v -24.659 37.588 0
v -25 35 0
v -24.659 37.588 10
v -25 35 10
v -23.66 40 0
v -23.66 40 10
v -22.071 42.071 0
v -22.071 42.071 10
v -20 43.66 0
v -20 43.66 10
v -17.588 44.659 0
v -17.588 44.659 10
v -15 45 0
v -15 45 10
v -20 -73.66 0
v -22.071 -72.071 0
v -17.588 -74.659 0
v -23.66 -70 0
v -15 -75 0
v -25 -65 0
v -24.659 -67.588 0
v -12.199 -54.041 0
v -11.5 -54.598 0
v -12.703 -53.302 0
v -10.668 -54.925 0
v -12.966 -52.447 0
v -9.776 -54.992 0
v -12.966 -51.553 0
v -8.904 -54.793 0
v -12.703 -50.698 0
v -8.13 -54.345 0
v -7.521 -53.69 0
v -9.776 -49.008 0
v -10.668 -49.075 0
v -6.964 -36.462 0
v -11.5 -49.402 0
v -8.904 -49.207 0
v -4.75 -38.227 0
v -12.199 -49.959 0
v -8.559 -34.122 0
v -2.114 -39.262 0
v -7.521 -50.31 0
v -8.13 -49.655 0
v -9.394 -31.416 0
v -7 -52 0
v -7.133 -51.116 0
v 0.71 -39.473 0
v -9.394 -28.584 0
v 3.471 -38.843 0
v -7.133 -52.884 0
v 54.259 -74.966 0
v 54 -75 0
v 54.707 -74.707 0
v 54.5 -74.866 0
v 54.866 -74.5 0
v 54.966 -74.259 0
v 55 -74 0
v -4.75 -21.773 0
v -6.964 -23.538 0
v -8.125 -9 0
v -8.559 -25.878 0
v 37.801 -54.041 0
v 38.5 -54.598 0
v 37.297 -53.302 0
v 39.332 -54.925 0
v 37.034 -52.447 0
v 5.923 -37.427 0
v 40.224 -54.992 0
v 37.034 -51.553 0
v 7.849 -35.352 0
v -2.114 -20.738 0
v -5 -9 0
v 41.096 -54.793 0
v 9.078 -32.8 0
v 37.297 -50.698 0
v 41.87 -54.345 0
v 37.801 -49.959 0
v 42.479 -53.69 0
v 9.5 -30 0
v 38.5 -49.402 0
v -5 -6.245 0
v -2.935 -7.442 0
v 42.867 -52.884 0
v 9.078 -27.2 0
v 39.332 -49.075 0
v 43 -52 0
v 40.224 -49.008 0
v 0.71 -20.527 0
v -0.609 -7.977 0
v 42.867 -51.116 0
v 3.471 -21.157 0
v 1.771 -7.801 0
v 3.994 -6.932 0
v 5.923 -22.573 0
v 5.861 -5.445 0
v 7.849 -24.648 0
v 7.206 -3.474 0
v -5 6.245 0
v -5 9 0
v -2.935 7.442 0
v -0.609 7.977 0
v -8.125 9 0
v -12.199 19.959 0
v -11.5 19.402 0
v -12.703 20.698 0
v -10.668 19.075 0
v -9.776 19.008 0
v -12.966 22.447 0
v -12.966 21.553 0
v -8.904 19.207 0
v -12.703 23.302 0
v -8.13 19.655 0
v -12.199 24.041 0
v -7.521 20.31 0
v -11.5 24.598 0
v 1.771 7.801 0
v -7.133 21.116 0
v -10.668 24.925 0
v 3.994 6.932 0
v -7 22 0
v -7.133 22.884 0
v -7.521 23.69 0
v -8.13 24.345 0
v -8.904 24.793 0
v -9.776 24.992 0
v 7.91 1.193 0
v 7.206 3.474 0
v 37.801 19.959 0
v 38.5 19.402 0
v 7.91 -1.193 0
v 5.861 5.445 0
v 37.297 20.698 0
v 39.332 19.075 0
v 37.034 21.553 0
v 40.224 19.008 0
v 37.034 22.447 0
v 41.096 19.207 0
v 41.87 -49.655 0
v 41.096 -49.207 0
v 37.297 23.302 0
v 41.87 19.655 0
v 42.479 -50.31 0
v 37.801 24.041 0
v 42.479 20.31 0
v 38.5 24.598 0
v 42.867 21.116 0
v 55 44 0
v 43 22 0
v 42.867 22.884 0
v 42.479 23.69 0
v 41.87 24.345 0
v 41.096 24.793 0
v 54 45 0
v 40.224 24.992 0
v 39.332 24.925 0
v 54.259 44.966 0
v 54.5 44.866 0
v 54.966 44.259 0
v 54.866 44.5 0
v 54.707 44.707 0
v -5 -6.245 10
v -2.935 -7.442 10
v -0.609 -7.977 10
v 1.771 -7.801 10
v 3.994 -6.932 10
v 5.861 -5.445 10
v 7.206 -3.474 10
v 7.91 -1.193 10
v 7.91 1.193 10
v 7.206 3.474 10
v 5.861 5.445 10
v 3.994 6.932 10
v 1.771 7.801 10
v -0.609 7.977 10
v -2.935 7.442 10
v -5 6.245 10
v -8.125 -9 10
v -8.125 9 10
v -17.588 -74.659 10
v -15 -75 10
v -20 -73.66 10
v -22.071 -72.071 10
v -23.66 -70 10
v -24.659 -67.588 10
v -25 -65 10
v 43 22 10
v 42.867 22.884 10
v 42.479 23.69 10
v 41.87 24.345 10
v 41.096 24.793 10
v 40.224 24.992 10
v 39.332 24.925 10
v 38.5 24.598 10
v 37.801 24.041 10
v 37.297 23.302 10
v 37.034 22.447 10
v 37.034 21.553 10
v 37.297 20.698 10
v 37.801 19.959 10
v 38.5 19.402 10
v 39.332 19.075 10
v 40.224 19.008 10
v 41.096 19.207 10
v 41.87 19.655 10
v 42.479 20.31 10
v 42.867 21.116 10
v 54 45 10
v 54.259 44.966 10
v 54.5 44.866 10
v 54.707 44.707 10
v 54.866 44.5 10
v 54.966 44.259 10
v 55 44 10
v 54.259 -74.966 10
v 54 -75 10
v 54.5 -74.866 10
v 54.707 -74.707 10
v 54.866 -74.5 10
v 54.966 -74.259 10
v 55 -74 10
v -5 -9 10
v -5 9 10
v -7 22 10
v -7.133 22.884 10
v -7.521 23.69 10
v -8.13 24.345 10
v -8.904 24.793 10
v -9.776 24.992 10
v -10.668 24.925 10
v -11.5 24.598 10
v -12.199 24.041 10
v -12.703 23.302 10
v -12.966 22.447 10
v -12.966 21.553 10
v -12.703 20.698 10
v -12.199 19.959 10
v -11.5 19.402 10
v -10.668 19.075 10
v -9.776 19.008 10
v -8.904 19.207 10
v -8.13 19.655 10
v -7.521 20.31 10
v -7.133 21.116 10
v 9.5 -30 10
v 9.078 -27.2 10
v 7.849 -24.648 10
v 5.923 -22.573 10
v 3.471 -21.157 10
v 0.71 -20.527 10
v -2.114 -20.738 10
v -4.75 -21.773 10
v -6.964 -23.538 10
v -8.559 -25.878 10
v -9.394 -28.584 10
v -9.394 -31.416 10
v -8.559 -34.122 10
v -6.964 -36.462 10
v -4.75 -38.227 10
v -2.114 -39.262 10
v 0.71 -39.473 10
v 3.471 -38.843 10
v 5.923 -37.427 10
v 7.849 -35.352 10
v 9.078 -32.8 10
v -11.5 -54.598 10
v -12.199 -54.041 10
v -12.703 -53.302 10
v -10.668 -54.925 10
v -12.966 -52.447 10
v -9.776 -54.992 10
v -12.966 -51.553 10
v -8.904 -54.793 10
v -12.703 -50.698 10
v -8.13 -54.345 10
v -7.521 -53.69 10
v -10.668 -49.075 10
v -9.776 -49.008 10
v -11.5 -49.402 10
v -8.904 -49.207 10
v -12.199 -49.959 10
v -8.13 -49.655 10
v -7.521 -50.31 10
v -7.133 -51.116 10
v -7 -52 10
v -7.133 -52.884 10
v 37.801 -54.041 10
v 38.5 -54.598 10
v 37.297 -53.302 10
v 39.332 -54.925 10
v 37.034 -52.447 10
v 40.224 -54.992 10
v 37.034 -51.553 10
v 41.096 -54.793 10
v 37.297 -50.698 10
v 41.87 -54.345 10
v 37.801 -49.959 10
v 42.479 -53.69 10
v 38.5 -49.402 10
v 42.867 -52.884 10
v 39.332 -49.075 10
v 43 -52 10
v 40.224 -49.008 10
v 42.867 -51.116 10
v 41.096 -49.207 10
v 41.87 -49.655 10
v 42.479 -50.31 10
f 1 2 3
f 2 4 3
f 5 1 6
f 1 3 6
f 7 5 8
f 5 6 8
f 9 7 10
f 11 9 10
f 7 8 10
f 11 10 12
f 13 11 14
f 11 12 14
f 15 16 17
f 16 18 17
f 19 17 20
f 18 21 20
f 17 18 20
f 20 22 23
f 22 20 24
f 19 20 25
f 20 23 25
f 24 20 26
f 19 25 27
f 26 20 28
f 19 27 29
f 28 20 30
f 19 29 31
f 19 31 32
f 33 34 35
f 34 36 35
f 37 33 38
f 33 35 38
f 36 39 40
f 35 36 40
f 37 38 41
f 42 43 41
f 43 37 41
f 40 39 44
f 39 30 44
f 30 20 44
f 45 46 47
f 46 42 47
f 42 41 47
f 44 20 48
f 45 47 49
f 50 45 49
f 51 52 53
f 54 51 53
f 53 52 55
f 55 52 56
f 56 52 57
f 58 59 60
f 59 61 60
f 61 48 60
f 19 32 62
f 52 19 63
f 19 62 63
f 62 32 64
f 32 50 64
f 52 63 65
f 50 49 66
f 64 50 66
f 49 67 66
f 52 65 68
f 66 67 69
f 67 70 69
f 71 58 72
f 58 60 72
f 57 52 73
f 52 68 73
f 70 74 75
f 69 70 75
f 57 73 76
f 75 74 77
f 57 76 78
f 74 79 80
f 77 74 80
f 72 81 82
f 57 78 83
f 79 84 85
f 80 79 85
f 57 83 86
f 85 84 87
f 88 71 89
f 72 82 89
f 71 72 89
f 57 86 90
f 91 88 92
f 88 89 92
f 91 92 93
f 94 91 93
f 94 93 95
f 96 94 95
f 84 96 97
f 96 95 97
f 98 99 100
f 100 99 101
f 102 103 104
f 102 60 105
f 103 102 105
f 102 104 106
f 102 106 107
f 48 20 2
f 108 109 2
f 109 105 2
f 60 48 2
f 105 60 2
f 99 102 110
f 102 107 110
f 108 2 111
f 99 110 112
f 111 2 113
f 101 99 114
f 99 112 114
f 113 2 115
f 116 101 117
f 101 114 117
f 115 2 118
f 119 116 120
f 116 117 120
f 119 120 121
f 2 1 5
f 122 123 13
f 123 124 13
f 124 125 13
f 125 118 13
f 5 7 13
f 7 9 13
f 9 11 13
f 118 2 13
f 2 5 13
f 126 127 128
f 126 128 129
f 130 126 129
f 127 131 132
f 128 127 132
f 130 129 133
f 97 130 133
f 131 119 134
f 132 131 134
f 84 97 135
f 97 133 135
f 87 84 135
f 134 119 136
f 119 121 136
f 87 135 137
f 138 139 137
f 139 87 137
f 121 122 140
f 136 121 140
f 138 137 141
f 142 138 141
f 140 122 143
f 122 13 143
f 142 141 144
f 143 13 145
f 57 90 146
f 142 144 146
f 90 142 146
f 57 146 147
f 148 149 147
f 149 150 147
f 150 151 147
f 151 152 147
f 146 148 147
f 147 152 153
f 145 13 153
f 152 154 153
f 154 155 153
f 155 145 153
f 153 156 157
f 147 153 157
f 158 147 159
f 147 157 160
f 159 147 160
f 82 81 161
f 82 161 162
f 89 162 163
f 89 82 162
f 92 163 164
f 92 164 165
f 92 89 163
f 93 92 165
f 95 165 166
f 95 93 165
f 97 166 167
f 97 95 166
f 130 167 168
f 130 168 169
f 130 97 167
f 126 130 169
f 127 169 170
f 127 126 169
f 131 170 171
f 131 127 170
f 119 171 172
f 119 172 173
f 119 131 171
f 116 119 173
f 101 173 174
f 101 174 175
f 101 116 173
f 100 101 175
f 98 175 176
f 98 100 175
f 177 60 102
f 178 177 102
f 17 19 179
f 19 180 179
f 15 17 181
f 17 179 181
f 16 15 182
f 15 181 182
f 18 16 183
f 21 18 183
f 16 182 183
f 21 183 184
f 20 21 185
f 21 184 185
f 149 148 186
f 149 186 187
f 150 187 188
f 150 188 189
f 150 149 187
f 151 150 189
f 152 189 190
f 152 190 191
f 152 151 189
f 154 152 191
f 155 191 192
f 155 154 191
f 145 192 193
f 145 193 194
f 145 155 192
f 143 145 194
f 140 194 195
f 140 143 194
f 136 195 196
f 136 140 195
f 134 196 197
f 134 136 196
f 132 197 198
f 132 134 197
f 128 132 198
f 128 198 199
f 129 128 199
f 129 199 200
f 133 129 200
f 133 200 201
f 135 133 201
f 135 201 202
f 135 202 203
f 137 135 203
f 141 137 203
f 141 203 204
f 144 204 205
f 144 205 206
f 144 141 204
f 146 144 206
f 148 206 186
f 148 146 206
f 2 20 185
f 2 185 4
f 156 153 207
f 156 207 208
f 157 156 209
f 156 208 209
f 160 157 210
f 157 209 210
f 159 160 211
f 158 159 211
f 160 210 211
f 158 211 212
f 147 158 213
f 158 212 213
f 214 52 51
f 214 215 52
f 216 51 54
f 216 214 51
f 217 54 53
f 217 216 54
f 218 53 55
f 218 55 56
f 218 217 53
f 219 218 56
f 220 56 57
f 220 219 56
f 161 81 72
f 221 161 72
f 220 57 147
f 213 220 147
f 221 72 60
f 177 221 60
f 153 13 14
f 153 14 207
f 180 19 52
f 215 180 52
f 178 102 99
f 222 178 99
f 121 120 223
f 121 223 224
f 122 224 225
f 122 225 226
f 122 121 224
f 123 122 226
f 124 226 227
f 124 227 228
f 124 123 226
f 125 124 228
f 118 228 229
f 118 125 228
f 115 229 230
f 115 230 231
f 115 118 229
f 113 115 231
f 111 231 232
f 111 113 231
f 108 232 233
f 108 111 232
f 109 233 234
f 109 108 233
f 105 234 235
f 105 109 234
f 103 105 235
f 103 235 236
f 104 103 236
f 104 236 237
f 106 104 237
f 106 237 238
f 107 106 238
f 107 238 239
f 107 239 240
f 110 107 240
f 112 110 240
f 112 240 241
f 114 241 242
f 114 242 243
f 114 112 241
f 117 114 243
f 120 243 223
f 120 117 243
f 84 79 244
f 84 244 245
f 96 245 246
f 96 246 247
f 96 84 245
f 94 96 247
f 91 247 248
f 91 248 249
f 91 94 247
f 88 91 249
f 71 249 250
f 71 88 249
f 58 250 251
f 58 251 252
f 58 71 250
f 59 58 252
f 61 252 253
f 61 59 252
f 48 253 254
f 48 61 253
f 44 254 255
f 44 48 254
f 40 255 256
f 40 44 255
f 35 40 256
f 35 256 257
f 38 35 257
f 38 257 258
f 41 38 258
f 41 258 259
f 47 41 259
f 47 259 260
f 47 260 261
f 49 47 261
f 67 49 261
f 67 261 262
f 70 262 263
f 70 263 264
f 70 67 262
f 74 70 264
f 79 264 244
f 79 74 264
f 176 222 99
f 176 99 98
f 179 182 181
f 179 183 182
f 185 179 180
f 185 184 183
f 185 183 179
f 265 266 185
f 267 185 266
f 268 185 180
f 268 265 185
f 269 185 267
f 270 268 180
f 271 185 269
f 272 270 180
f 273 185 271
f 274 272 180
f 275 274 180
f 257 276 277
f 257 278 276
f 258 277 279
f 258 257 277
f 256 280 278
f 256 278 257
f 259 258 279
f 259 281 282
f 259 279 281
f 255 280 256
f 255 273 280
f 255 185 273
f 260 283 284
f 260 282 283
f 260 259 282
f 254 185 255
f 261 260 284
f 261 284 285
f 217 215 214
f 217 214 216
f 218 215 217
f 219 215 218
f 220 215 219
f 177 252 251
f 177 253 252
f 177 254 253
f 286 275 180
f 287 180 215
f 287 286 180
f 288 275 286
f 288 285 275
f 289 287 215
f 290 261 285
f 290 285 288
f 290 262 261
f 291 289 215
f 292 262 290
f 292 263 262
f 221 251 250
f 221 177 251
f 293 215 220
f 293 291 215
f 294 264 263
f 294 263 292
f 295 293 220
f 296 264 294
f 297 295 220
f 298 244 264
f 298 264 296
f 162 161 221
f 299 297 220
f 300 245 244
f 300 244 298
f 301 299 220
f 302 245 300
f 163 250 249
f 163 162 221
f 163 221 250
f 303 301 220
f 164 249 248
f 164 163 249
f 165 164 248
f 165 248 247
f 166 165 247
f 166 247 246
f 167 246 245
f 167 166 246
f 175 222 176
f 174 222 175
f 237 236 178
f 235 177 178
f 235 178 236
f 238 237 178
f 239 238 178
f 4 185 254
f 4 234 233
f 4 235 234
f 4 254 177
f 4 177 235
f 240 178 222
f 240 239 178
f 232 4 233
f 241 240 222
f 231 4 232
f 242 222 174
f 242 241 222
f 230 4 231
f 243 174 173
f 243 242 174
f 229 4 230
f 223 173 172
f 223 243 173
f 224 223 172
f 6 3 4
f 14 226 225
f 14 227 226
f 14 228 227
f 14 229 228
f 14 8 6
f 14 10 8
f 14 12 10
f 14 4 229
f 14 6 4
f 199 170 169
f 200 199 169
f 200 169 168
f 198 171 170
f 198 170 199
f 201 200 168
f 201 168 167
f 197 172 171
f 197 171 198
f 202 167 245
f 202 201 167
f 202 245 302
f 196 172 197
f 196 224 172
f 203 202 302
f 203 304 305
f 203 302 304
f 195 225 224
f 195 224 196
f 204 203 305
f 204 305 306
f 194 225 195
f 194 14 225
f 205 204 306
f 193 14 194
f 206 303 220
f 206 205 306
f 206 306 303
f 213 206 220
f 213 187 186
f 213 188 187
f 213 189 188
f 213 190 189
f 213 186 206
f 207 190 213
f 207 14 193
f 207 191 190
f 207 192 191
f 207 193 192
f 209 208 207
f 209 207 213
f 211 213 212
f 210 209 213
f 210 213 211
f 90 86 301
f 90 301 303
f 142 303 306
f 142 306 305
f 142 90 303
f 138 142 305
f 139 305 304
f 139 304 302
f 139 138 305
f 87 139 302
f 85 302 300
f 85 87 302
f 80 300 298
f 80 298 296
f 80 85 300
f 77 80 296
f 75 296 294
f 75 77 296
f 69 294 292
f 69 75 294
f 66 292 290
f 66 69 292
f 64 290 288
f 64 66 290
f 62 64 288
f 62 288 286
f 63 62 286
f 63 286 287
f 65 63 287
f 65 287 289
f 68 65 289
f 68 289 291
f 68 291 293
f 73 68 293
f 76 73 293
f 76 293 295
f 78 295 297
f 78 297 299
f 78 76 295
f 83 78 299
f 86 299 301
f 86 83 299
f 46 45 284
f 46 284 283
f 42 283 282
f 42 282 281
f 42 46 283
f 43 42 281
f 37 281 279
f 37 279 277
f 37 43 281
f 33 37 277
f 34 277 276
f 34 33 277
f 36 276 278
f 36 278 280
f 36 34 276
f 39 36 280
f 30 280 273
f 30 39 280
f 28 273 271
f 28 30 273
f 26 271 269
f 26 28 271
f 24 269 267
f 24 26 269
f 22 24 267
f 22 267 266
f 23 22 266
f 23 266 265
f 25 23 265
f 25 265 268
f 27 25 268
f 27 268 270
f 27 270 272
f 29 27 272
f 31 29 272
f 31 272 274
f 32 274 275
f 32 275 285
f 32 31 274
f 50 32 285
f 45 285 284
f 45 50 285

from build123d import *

# Parameters (mm, degrees)
SKETCH_W    = 80
SKETCH_H    = 120
SKETCH_R    = 9.5
SKETCH_R_2  = 3
PAD_DEPTH   = 10
FILLET_R    = 1
FILLET001_R = 10


with BuildPart() as part:
    # Sketch → Pad (new body)
    with BuildSketch(Plane.XY):
        with Locations((15, -15)):
            Rectangle(SKETCH_W, SKETCH_H)
        with Locations((0, -30)):
            Circle(SKETCH_R, mode=Mode.SUBTRACT)
        with Locations((-10, -52)):
            Circle(SKETCH_R_2, mode=Mode.SUBTRACT)
        with Locations((40, -52)):
            Circle(SKETCH_R_2, mode=Mode.SUBTRACT)
        with Locations((40, 22)):
            Circle(SKETCH_R_2, mode=Mode.SUBTRACT)
        with Locations((-10, 22)):
            Circle(SKETCH_R_2, mode=Mode.SUBTRACT)
        with BuildLine():
            ThreePointArc((-5, -6.244998), (8, 0), (-5, 6.244998))
            Line((-5, 9), (-5, 6.244998))
            Line((-8.125, 9), (-5, 9))
            Line((-8.125, -9), (-8.125, 9))
            Line((-5, -9), (-8.125, -9))
            Line((-5, -6.244998), (-5, -9))
        make_face(mode=Mode.SUBTRACT)
    extrude(amount=PAD_DEPTH)

    # Fillet
    fillet_edges = [part.edges().sort_by_distance(p)[0] for p in [
        (55, -75, 5),
        (55, 45, 5),
    ]]
    fillet(fillet_edges, radius=FILLET_R)

    # Fillet001
    fillet001_edges = [part.edges().sort_by_distance(p)[0] for p in [
        (-25, -75, 5),
        (-25, 45, 5),
    ]]
    fillet(fillet001_edges, radius=FILLET001_R)


solid = part.part
